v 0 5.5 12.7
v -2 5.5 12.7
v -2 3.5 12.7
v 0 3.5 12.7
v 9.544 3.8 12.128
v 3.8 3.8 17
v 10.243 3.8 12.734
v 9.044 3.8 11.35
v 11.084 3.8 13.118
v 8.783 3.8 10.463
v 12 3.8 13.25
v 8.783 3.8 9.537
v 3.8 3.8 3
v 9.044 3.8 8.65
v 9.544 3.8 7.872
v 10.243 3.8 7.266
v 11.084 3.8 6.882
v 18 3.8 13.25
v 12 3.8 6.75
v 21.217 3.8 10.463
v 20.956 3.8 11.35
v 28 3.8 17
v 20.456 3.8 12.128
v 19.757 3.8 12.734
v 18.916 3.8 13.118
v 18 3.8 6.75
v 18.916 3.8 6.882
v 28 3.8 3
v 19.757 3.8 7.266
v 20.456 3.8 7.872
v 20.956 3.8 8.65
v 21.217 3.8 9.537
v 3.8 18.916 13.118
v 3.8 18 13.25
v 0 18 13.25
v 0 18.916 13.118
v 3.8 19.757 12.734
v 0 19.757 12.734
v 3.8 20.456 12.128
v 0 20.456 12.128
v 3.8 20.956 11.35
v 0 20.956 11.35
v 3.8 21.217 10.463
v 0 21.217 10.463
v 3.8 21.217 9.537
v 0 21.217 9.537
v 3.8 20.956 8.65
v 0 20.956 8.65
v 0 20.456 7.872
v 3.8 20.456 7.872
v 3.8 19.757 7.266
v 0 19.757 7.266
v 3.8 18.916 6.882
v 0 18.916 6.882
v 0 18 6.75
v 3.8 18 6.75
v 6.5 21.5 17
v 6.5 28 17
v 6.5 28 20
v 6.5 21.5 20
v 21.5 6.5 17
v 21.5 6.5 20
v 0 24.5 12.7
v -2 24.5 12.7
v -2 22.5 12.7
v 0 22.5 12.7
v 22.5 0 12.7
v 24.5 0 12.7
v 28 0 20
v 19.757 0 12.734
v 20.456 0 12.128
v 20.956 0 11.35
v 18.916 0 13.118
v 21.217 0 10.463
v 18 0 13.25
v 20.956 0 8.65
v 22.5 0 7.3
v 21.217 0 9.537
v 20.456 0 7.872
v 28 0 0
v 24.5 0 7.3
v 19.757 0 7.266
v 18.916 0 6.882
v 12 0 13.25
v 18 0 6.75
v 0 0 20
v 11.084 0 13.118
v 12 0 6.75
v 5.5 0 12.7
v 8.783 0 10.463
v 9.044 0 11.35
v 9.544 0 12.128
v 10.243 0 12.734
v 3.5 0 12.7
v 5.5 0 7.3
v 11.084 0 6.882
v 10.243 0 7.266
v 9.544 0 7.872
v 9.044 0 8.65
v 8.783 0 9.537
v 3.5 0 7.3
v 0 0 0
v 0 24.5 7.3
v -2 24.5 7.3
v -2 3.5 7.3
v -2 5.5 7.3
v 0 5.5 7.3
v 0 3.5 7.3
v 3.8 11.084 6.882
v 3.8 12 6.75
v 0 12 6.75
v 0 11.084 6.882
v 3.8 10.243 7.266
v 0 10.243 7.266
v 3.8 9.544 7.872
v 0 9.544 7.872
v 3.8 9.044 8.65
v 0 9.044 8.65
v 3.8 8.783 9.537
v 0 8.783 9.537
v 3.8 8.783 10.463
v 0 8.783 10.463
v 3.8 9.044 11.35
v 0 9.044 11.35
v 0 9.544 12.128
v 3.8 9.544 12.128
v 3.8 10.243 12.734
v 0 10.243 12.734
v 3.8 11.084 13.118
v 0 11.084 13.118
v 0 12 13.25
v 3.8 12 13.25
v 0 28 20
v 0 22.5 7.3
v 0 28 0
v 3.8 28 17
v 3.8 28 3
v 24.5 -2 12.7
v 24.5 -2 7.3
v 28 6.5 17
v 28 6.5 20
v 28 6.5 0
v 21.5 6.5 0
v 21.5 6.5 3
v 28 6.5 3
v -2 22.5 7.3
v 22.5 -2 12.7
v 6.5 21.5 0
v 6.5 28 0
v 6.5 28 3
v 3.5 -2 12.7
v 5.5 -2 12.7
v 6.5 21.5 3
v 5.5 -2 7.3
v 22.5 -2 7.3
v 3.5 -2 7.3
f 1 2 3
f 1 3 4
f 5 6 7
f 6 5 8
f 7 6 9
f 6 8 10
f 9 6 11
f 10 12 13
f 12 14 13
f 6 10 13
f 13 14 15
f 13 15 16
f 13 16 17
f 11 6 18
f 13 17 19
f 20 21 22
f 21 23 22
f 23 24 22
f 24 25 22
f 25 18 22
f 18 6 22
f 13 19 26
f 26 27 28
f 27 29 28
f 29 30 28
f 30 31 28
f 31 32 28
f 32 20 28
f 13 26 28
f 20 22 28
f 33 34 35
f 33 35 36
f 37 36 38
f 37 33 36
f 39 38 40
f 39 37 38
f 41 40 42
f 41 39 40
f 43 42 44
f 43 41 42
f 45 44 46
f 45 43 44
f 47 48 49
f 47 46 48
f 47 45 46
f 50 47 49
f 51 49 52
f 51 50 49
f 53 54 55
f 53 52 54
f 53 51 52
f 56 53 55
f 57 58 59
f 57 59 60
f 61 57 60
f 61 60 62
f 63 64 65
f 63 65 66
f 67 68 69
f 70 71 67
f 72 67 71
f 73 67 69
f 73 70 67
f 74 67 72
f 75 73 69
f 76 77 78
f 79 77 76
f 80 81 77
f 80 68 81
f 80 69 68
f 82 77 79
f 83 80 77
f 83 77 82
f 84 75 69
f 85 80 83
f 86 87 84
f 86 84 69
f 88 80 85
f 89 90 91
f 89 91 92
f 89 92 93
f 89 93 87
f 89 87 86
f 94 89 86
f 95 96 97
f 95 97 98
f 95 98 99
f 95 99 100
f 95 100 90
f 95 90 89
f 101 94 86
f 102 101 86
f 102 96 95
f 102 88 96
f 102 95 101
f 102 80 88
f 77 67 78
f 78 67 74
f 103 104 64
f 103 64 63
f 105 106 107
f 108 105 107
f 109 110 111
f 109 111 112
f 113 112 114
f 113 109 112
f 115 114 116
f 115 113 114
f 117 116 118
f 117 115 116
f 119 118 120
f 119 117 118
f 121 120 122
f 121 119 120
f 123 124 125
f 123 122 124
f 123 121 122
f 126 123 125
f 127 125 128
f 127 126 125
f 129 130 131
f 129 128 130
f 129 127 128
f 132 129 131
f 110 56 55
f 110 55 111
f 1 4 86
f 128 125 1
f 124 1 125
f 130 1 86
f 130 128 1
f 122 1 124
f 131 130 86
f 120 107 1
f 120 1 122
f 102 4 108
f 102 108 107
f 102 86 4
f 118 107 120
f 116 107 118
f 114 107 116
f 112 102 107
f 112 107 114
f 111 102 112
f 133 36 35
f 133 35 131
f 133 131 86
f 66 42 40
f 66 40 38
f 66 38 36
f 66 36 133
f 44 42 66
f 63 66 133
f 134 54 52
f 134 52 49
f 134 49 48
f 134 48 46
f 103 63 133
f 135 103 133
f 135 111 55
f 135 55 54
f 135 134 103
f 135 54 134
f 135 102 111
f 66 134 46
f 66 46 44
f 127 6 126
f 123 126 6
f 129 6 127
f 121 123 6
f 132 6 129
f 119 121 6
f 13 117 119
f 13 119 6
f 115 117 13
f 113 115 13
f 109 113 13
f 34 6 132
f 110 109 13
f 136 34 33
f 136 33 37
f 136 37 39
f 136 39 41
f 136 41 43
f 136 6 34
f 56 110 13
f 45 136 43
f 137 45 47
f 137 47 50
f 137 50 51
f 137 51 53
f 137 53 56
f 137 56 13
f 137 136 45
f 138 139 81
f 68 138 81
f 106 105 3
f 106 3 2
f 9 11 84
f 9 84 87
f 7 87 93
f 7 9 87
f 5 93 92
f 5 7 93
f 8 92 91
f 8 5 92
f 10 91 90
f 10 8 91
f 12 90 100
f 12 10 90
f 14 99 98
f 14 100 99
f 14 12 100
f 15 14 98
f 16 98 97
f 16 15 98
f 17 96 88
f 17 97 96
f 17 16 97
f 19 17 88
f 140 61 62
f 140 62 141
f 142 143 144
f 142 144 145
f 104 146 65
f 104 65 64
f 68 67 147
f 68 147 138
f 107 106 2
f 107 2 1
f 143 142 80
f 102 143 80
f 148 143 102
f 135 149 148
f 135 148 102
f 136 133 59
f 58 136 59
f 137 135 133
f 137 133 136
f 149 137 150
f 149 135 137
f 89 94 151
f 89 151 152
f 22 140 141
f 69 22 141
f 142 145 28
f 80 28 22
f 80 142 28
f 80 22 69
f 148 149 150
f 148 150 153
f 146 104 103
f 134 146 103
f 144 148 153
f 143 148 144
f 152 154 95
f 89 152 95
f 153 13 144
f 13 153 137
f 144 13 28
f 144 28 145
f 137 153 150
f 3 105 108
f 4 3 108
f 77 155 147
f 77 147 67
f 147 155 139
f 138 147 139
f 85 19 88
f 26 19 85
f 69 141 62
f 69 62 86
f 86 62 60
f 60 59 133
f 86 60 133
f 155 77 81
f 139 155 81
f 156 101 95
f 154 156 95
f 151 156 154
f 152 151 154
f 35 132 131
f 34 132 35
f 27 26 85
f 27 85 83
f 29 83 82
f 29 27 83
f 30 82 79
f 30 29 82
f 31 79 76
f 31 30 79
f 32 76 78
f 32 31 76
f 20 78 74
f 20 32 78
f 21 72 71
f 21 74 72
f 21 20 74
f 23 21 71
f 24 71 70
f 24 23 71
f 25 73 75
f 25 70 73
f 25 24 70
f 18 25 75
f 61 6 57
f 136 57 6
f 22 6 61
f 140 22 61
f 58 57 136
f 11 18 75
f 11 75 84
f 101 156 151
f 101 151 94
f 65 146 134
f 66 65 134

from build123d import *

# Parameters (mm, degrees)
EXTRUDE_3_DEPTH      = 20
SKETCH_8_W           = 14
SKETCH_8_H           = 24.2
CUT_EXTRUDE_5_DEPTH  = 24.2
CUT_EXTRUDE_6_DEPTH  = 43.067089274
CUT_EXTRUDE_7_DEPTH  = 43.067089274
EXTRUDE_4_DEPTH      = 2.7
EXTRUDE_4_DEPTH_BACK = 2.7
SKETCH_11_W          = 2
SKETCH_11_H          = 2


with BuildPart() as part:
    # 草图7 → 凸台-拉伸3 (new body)
    with BuildSketch(Plane.XY):
        Polygon((0, 0), (0, 28), (6.5, 28), (6.5, 21.5), (21.5, 6.5), (28, 6.5), (28, 0), align=None)
    extrude(amount=EXTRUDE_3_DEPTH)

    # 草图8 → 切除-拉伸5 (cut)
    with BuildSketch(Plane(origin=(28, 0, 0), x_dir=(0, 0, -1), z_dir=(1, 0, 0))):
        with Locations((-10, 15.9)):
            Rectangle(SKETCH_8_W, SKETCH_8_H)
    extrude(amount=-CUT_EXTRUDE_5_DEPTH, mode=Mode.SUBTRACT)

    # 草图9 → 切除-拉伸6 (cut, through all)
    with BuildSketch(Plane(origin=(3.8, 0, 0), x_dir=(0, 0, -1), z_dir=(1, 0, 0))):
        with BuildLine():
            Line((-6.75, 18), (-6.75, 12))
            ThreePointArc((-6.75, 12), (-10, 8.75), (-13.25, 12))
            Line((-13.25, 12), (-13.25, 18))
            ThreePointArc((-13.25, 18), (-10, 21.25), (-6.75, 18))
        make_face()
    extrude(amount=-CUT_EXTRUDE_6_DEPTH, mode=Mode.SUBTRACT)

    # 草图10 → 切除-拉伸7 (cut, through all)
    with BuildSketch(Plane(origin=(0, 3.8, 0), x_dir=(1, 0, 0), z_dir=(0, 1, 0))):
        with BuildLine():
            Line((12, -6.75), (18, -6.75))
            ThreePointArc((18, -6.75), (21.25, -10), (18, -13.25))
            Line((18, -13.25), (12, -13.25))
            ThreePointArc((12, -13.25), (8.75, -10), (12, -6.75))
        make_face()
    extrude(amount=-CUT_EXTRUDE_7_DEPTH, mode=Mode.SUBTRACT)

    # 草图11 → 凸台-拉伸4 (add, two sides: drawn at the far end of the back side and taken through both)
    with BuildSketch(Plane.XY.offset(10).offset(-EXTRUDE_4_DEPTH_BACK)):
        with Locations((4.5, -1)):
            Rectangle(SKETCH_11_W, SKETCH_11_H)
        with Locations((23.5, -1)):
            Rectangle(SKETCH_11_W, SKETCH_11_H)
        with Locations((-1, 23.5)):
            Rectangle(SKETCH_11_W, SKETCH_11_H)
        with Locations((-1, 4.5)):
            Rectangle(SKETCH_11_W, SKETCH_11_H)
    extrude(amount=EXTRUDE_4_DEPTH + EXTRUDE_4_DEPTH_BACK)


solid = part.part
